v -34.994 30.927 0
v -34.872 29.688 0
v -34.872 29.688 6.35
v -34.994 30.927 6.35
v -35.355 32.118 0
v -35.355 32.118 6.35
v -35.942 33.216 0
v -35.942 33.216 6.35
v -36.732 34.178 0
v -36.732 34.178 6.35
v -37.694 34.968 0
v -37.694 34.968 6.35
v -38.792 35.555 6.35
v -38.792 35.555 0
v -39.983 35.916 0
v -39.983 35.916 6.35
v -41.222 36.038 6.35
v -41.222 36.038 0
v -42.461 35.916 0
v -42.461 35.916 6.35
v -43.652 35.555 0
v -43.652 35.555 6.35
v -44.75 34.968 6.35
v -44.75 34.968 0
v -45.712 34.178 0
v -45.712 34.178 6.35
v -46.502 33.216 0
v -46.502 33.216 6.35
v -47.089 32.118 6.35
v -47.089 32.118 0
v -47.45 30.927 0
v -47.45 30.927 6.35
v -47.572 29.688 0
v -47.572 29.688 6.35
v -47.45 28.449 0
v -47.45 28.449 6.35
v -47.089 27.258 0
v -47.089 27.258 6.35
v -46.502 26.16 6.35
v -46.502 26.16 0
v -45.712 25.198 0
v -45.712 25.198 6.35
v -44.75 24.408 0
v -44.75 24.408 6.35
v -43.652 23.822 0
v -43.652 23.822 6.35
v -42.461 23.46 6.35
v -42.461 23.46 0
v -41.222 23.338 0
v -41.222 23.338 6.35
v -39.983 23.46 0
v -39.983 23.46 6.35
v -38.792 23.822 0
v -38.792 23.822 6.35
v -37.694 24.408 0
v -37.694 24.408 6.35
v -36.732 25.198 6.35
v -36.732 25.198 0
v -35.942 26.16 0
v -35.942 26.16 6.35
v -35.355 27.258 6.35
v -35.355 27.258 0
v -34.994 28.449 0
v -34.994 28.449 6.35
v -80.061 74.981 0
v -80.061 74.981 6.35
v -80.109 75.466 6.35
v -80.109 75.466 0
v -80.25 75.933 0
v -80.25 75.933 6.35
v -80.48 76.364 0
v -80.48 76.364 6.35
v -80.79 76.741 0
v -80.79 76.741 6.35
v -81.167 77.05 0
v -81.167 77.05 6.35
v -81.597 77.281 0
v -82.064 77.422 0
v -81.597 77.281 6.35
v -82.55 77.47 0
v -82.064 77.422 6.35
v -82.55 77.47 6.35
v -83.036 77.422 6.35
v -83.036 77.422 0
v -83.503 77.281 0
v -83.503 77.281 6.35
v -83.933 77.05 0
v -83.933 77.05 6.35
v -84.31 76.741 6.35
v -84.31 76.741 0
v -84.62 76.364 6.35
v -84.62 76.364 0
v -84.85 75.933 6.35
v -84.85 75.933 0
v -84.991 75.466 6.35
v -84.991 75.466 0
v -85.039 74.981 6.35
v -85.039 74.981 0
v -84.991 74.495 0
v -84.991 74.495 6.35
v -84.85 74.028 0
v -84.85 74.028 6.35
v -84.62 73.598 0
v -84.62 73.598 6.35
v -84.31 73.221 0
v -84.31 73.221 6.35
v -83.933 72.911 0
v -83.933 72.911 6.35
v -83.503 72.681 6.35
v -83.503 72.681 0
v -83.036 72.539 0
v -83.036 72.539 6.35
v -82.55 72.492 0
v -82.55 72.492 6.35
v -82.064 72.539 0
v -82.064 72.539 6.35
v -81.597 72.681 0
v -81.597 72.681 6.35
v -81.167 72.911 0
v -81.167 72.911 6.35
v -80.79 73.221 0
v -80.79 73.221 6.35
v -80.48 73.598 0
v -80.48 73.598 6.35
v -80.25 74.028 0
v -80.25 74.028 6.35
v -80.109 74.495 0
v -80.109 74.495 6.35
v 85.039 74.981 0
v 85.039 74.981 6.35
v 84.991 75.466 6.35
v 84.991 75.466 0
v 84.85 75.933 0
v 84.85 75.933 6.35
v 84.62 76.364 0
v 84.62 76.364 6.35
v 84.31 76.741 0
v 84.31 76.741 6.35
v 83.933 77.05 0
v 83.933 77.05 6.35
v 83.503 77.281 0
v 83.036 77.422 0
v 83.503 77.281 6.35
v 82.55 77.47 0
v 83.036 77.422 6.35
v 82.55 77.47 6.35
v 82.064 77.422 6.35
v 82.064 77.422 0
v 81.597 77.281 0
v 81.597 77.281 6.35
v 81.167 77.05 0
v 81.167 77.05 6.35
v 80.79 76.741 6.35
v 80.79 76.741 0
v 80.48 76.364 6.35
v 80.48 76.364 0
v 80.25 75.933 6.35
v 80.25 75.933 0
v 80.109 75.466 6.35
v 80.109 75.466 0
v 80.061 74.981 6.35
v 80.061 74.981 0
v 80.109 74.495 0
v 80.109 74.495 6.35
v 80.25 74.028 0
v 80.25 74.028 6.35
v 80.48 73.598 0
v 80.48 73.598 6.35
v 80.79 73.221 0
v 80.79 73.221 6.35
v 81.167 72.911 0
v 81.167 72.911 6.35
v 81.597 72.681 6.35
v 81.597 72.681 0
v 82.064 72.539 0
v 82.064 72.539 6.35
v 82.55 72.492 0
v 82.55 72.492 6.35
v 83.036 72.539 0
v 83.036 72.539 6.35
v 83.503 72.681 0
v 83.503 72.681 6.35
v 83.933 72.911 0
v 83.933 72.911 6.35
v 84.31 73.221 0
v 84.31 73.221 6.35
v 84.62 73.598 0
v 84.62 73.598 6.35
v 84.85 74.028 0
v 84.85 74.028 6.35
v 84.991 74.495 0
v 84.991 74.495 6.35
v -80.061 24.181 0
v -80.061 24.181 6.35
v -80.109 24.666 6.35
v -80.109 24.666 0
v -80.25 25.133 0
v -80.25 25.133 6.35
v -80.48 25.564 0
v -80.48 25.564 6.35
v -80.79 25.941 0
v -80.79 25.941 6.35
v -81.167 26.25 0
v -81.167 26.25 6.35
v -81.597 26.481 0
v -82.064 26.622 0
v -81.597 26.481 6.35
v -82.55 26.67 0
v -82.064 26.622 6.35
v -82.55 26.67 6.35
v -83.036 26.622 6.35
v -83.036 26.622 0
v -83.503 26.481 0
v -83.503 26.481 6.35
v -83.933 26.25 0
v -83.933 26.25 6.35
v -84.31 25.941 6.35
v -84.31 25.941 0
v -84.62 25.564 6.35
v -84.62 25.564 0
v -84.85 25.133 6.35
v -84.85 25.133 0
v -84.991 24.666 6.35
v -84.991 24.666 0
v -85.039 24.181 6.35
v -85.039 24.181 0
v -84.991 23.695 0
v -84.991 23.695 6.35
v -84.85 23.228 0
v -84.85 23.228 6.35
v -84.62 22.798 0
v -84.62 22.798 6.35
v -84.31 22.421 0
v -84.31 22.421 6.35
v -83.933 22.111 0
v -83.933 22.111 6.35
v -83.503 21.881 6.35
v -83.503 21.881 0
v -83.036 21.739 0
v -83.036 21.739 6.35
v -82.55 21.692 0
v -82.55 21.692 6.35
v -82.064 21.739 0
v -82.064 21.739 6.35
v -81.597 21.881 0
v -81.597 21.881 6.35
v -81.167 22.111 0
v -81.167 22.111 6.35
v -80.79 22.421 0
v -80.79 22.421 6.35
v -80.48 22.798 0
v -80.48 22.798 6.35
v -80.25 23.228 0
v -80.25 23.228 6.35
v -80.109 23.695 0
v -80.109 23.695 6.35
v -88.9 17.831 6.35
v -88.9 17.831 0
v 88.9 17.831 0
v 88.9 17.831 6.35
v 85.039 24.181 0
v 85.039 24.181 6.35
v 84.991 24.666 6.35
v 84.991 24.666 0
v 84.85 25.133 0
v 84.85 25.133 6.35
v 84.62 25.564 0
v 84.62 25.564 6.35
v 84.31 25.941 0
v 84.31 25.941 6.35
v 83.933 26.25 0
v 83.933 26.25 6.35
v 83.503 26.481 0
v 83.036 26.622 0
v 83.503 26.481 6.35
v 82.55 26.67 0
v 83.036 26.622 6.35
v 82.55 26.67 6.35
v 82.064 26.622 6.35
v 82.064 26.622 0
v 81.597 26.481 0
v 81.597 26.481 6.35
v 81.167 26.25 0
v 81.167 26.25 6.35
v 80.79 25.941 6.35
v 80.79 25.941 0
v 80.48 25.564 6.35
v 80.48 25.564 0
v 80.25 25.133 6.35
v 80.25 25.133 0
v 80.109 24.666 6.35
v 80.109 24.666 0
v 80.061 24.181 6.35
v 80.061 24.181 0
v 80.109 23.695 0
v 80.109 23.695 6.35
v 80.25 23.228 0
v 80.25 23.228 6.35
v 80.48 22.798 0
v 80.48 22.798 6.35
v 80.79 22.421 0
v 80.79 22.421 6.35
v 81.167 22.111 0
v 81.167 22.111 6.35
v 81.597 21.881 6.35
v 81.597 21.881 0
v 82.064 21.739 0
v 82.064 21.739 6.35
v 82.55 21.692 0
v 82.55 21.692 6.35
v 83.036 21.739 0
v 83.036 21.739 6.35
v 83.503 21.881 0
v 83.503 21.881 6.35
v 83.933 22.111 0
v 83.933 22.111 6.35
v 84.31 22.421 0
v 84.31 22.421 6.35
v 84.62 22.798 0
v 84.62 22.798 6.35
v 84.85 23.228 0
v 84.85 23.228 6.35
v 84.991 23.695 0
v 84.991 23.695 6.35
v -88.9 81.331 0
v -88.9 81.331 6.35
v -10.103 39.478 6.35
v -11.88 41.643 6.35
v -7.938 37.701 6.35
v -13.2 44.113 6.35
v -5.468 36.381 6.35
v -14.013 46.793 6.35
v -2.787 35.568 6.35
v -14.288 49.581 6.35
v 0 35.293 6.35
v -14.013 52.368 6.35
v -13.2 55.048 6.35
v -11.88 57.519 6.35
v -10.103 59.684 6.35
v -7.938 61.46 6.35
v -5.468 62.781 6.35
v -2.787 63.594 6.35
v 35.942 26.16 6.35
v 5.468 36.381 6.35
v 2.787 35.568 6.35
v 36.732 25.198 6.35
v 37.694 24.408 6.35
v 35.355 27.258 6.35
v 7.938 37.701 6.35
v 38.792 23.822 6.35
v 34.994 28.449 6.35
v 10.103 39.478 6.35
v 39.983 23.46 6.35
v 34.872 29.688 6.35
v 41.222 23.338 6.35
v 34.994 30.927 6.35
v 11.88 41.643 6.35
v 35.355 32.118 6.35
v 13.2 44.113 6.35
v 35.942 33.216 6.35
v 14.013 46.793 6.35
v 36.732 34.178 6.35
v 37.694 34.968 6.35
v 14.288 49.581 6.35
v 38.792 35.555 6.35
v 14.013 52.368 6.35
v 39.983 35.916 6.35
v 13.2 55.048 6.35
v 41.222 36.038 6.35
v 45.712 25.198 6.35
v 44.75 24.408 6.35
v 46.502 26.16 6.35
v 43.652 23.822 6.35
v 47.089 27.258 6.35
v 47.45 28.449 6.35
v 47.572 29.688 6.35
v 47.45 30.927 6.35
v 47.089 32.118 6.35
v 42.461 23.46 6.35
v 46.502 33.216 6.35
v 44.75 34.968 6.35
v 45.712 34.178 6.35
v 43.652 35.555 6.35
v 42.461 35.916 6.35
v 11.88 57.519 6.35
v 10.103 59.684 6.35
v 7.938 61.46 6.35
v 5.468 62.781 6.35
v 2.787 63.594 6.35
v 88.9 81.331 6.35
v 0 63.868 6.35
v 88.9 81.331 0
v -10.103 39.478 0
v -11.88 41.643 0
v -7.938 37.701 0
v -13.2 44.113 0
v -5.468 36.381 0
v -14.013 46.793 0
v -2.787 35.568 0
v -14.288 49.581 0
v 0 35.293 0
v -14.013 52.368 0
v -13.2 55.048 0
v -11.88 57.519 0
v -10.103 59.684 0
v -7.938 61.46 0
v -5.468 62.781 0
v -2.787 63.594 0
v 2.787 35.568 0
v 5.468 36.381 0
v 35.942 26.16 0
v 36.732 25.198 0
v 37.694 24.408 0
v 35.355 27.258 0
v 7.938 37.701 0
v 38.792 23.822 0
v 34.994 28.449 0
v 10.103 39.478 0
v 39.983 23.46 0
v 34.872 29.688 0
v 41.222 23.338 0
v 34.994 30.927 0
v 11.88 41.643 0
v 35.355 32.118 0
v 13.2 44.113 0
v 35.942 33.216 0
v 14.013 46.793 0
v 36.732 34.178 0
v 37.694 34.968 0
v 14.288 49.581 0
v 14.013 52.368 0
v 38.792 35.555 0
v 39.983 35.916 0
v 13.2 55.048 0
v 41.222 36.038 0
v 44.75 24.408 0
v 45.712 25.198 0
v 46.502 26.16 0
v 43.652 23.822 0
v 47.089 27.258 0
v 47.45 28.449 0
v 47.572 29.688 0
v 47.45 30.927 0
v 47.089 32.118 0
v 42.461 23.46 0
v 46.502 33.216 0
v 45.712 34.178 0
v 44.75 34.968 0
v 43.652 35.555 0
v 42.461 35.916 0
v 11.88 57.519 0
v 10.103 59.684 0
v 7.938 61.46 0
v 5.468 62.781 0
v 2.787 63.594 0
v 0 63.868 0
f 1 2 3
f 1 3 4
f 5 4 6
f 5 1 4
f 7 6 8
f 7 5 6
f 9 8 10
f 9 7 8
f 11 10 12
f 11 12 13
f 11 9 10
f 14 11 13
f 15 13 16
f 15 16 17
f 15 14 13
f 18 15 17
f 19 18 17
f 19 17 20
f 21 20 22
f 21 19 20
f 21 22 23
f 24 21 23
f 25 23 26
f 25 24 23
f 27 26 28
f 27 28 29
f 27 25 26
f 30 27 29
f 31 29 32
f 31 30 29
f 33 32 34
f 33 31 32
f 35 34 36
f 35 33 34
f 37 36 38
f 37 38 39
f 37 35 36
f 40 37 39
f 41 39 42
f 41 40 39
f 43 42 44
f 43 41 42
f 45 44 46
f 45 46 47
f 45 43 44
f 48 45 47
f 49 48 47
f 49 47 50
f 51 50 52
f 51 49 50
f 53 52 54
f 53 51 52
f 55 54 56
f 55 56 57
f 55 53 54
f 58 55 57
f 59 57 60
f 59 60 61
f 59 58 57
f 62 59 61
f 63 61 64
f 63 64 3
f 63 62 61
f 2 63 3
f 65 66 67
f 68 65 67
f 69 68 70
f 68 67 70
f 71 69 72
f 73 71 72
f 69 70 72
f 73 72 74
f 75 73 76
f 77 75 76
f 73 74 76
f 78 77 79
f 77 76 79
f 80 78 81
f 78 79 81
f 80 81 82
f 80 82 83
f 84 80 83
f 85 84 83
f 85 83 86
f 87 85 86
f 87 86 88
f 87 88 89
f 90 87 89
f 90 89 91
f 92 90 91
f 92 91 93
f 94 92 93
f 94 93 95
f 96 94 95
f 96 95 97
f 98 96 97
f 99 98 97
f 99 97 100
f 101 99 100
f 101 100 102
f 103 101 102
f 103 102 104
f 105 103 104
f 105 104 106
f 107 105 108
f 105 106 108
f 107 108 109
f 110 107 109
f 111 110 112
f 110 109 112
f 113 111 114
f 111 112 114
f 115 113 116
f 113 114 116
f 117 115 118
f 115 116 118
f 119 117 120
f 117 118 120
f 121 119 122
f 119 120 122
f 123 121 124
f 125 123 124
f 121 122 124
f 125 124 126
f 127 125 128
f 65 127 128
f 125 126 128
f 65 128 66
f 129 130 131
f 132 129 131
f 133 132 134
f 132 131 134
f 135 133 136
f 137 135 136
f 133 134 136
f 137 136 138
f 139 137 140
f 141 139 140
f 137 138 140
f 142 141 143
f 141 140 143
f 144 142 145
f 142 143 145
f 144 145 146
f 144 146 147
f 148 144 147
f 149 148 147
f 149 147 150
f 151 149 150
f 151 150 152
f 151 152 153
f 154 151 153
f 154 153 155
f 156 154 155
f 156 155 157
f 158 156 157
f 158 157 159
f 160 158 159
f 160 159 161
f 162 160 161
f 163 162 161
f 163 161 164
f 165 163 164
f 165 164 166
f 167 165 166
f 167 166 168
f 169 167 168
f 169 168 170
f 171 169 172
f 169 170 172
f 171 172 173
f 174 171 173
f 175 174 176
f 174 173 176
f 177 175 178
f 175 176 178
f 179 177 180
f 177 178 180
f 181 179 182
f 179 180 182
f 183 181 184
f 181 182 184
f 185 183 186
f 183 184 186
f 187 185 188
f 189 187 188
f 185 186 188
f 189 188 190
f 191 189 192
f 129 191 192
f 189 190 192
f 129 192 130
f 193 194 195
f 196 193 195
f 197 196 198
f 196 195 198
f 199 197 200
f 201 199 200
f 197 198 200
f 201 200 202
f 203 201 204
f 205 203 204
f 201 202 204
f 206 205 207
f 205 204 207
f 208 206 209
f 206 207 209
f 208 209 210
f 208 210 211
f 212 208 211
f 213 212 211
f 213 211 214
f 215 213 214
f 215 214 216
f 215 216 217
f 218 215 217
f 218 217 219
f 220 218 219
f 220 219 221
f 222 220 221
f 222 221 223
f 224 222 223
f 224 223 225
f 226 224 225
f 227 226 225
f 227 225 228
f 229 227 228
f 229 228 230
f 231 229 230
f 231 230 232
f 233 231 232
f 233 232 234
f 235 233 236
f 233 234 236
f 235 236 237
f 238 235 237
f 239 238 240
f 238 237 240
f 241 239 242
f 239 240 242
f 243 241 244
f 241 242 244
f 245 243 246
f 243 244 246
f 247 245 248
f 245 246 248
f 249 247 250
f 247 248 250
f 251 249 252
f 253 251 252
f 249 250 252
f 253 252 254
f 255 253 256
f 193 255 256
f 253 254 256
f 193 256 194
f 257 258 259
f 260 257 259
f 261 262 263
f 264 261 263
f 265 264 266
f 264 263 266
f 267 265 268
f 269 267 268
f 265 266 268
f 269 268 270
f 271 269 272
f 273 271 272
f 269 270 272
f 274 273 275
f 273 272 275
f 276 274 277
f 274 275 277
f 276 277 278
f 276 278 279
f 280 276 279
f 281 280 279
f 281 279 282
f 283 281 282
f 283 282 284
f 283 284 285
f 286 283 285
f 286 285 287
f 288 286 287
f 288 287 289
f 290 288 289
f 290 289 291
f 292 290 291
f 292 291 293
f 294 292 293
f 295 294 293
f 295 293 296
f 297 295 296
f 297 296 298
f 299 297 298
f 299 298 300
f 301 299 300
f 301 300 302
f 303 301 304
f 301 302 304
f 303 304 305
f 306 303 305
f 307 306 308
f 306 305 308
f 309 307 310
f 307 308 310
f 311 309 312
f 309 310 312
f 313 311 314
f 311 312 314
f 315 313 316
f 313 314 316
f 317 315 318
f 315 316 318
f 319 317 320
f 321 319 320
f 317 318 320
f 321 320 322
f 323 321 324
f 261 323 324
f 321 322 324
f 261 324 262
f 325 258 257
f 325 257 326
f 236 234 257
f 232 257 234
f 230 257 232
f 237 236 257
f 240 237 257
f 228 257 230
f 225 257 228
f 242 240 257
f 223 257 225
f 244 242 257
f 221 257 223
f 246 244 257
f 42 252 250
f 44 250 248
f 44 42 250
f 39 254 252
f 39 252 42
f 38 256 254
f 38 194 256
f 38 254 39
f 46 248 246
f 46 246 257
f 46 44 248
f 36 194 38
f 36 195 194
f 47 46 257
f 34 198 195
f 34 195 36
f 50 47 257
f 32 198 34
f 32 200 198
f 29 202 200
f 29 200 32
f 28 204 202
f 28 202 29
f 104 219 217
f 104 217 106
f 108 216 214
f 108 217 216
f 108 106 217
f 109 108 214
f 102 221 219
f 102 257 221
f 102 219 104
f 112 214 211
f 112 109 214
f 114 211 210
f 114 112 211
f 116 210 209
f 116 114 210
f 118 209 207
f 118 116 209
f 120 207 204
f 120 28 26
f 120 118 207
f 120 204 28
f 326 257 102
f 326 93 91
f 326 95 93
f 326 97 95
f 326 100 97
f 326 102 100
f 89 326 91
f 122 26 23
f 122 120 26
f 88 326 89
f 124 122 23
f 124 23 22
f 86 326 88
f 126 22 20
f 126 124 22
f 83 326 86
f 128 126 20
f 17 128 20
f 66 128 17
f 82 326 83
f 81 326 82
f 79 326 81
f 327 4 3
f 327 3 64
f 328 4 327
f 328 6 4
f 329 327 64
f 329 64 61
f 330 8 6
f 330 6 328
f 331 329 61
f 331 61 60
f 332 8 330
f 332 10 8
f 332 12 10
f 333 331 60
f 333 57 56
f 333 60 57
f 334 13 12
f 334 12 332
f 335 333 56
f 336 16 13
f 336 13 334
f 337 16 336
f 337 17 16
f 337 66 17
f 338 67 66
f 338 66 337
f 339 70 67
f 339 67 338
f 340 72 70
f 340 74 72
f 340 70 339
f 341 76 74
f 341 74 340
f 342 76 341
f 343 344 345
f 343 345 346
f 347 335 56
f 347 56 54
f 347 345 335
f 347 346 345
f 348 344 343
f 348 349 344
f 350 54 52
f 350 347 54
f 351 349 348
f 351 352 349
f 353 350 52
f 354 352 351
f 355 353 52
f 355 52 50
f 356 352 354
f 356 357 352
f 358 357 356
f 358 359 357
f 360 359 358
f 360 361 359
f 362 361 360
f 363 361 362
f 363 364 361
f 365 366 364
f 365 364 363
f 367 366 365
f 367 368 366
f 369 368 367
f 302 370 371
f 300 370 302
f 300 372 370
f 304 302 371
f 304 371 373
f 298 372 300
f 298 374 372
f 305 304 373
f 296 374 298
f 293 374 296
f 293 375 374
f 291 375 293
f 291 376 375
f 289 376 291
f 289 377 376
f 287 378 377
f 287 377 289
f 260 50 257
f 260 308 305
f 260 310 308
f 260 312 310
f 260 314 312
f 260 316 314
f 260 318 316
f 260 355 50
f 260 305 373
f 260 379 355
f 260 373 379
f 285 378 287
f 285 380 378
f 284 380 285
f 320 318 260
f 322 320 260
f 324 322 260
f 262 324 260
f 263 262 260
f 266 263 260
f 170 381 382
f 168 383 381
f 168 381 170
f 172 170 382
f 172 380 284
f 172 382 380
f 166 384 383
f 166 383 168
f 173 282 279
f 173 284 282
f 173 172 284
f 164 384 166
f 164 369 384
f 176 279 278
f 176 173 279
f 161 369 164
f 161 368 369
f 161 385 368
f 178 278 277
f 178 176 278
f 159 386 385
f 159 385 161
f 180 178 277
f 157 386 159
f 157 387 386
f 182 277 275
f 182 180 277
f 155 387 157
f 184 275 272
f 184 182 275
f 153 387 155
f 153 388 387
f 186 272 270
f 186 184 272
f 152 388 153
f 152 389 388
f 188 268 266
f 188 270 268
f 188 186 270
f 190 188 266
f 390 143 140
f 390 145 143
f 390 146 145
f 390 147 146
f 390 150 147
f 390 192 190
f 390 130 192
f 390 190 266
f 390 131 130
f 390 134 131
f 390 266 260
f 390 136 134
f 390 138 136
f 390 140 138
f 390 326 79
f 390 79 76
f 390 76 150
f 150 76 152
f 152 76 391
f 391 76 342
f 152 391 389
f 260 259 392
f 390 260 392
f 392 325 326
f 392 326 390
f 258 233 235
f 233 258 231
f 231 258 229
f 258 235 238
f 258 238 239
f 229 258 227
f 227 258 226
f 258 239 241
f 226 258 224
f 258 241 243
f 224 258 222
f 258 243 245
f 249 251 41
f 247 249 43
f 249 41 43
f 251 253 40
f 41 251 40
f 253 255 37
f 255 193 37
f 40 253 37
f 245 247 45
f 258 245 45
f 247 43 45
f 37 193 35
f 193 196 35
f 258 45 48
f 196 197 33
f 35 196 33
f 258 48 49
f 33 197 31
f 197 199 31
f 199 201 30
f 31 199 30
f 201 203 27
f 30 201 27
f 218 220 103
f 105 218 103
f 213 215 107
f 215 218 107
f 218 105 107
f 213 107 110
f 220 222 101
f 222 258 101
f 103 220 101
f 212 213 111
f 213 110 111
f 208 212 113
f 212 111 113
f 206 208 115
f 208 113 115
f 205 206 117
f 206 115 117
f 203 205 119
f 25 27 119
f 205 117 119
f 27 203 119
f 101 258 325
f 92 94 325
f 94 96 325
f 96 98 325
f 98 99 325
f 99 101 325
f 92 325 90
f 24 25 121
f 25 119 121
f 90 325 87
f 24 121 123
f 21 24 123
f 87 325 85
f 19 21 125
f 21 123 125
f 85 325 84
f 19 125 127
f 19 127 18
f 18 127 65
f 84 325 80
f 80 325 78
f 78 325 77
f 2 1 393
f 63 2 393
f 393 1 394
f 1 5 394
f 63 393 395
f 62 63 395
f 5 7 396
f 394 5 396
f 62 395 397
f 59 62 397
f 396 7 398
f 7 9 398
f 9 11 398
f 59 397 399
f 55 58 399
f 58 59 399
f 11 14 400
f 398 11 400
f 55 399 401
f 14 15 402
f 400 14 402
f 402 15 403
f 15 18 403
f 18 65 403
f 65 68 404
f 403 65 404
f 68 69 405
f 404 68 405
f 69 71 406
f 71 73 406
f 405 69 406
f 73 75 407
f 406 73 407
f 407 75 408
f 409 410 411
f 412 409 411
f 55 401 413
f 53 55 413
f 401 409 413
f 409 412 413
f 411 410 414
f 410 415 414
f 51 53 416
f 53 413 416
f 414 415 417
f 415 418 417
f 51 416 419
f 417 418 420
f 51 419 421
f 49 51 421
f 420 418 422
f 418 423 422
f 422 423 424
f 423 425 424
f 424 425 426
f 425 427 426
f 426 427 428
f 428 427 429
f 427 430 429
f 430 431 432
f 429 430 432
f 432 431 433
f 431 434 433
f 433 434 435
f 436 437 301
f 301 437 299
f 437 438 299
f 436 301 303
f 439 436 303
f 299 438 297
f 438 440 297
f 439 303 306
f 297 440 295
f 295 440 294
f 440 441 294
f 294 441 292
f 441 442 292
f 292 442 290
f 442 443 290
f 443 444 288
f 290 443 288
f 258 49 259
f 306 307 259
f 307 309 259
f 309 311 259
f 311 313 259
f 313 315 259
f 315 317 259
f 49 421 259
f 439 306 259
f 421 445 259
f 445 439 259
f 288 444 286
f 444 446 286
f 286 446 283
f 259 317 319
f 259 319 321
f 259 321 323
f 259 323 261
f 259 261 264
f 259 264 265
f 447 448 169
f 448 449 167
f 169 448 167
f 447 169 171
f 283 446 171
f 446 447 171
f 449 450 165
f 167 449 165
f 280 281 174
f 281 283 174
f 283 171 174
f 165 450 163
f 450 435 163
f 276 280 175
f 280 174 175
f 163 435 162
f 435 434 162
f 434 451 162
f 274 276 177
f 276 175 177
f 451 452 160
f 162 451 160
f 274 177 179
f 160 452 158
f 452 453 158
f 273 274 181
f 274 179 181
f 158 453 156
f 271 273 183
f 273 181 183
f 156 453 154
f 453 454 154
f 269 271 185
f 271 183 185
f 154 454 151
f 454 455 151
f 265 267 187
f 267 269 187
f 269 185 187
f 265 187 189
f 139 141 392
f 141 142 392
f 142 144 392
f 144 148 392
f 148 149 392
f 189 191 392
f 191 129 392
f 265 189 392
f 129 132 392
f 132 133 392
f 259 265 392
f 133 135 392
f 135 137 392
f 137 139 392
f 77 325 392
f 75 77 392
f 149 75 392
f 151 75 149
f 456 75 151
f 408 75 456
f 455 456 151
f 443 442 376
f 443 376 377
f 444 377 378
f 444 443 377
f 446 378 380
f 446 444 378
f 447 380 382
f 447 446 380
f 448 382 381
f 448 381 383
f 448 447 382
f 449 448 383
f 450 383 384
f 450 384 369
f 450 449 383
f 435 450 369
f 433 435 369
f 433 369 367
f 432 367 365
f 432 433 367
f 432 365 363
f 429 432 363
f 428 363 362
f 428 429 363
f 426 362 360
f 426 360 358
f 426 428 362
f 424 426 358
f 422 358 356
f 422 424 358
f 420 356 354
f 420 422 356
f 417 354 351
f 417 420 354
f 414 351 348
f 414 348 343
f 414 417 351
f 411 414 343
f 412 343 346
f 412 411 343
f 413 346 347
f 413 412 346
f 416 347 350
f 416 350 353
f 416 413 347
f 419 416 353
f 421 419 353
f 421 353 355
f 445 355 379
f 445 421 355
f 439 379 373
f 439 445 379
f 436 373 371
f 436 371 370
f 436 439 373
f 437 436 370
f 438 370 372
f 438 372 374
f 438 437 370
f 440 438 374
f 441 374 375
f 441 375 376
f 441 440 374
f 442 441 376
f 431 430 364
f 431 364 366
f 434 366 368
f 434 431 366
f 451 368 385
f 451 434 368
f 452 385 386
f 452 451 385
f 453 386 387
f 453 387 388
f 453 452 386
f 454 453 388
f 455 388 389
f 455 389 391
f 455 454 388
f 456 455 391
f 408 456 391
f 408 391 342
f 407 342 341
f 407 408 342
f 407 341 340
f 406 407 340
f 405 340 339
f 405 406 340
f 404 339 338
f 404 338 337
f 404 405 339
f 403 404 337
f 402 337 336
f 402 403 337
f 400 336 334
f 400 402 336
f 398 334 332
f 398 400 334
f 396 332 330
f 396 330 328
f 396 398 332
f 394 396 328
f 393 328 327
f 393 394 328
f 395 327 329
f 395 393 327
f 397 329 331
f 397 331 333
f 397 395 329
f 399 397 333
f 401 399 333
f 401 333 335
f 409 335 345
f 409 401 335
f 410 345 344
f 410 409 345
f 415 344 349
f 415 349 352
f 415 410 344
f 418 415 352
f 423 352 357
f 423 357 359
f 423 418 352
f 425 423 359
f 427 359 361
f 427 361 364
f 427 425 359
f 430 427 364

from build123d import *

# Parameters (mm, degrees)
SKETCH1_W                  = 177.8
SKETCH1_H                  = 63.5
SKETCH1_R                  = 6.35
SKETCH1_R_2                = 14.2875
BOSS_EXTRUDE2_DEPTH        = 6.35
F_9_0_196_DIAMETER_HOLE1_D = 4.9784


with BuildPart() as part:
    # Sketch1 → Boss-Extrude2 (new body)
    with BuildSketch(Plane.XY):
        with Locations((0, 49.5808)):
            Rectangle(SKETCH1_W, SKETCH1_H)
        with Locations((-41.221968309, 29.688201844)):
            Circle(SKETCH1_R, mode=Mode.SUBTRACT)
        with Locations((0, 49.5808)):
            Circle(SKETCH1_R_2, mode=Mode.SUBTRACT)
        with Locations((41.221968309, 29.688201844)):
            Circle(SKETCH1_R, mode=Mode.SUBTRACT)
    extrude(amount=BOSS_EXTRUDE2_DEPTH)

    # #9 (0.196) Diameter Hole1 (through all)
    with Locations(Plane(origin=(0, 0, 0), x_dir=(-1, 0, 0), z_dir=(0, 0, -1))):
        with Locations((-82.55, 74.9808), (-82.55, 24.1808), (82.55, 24.1808), (82.55, 74.9808)):
            Hole(F_9_0_196_DIAMETER_HOLE1_D / 2)


solid = part.part
